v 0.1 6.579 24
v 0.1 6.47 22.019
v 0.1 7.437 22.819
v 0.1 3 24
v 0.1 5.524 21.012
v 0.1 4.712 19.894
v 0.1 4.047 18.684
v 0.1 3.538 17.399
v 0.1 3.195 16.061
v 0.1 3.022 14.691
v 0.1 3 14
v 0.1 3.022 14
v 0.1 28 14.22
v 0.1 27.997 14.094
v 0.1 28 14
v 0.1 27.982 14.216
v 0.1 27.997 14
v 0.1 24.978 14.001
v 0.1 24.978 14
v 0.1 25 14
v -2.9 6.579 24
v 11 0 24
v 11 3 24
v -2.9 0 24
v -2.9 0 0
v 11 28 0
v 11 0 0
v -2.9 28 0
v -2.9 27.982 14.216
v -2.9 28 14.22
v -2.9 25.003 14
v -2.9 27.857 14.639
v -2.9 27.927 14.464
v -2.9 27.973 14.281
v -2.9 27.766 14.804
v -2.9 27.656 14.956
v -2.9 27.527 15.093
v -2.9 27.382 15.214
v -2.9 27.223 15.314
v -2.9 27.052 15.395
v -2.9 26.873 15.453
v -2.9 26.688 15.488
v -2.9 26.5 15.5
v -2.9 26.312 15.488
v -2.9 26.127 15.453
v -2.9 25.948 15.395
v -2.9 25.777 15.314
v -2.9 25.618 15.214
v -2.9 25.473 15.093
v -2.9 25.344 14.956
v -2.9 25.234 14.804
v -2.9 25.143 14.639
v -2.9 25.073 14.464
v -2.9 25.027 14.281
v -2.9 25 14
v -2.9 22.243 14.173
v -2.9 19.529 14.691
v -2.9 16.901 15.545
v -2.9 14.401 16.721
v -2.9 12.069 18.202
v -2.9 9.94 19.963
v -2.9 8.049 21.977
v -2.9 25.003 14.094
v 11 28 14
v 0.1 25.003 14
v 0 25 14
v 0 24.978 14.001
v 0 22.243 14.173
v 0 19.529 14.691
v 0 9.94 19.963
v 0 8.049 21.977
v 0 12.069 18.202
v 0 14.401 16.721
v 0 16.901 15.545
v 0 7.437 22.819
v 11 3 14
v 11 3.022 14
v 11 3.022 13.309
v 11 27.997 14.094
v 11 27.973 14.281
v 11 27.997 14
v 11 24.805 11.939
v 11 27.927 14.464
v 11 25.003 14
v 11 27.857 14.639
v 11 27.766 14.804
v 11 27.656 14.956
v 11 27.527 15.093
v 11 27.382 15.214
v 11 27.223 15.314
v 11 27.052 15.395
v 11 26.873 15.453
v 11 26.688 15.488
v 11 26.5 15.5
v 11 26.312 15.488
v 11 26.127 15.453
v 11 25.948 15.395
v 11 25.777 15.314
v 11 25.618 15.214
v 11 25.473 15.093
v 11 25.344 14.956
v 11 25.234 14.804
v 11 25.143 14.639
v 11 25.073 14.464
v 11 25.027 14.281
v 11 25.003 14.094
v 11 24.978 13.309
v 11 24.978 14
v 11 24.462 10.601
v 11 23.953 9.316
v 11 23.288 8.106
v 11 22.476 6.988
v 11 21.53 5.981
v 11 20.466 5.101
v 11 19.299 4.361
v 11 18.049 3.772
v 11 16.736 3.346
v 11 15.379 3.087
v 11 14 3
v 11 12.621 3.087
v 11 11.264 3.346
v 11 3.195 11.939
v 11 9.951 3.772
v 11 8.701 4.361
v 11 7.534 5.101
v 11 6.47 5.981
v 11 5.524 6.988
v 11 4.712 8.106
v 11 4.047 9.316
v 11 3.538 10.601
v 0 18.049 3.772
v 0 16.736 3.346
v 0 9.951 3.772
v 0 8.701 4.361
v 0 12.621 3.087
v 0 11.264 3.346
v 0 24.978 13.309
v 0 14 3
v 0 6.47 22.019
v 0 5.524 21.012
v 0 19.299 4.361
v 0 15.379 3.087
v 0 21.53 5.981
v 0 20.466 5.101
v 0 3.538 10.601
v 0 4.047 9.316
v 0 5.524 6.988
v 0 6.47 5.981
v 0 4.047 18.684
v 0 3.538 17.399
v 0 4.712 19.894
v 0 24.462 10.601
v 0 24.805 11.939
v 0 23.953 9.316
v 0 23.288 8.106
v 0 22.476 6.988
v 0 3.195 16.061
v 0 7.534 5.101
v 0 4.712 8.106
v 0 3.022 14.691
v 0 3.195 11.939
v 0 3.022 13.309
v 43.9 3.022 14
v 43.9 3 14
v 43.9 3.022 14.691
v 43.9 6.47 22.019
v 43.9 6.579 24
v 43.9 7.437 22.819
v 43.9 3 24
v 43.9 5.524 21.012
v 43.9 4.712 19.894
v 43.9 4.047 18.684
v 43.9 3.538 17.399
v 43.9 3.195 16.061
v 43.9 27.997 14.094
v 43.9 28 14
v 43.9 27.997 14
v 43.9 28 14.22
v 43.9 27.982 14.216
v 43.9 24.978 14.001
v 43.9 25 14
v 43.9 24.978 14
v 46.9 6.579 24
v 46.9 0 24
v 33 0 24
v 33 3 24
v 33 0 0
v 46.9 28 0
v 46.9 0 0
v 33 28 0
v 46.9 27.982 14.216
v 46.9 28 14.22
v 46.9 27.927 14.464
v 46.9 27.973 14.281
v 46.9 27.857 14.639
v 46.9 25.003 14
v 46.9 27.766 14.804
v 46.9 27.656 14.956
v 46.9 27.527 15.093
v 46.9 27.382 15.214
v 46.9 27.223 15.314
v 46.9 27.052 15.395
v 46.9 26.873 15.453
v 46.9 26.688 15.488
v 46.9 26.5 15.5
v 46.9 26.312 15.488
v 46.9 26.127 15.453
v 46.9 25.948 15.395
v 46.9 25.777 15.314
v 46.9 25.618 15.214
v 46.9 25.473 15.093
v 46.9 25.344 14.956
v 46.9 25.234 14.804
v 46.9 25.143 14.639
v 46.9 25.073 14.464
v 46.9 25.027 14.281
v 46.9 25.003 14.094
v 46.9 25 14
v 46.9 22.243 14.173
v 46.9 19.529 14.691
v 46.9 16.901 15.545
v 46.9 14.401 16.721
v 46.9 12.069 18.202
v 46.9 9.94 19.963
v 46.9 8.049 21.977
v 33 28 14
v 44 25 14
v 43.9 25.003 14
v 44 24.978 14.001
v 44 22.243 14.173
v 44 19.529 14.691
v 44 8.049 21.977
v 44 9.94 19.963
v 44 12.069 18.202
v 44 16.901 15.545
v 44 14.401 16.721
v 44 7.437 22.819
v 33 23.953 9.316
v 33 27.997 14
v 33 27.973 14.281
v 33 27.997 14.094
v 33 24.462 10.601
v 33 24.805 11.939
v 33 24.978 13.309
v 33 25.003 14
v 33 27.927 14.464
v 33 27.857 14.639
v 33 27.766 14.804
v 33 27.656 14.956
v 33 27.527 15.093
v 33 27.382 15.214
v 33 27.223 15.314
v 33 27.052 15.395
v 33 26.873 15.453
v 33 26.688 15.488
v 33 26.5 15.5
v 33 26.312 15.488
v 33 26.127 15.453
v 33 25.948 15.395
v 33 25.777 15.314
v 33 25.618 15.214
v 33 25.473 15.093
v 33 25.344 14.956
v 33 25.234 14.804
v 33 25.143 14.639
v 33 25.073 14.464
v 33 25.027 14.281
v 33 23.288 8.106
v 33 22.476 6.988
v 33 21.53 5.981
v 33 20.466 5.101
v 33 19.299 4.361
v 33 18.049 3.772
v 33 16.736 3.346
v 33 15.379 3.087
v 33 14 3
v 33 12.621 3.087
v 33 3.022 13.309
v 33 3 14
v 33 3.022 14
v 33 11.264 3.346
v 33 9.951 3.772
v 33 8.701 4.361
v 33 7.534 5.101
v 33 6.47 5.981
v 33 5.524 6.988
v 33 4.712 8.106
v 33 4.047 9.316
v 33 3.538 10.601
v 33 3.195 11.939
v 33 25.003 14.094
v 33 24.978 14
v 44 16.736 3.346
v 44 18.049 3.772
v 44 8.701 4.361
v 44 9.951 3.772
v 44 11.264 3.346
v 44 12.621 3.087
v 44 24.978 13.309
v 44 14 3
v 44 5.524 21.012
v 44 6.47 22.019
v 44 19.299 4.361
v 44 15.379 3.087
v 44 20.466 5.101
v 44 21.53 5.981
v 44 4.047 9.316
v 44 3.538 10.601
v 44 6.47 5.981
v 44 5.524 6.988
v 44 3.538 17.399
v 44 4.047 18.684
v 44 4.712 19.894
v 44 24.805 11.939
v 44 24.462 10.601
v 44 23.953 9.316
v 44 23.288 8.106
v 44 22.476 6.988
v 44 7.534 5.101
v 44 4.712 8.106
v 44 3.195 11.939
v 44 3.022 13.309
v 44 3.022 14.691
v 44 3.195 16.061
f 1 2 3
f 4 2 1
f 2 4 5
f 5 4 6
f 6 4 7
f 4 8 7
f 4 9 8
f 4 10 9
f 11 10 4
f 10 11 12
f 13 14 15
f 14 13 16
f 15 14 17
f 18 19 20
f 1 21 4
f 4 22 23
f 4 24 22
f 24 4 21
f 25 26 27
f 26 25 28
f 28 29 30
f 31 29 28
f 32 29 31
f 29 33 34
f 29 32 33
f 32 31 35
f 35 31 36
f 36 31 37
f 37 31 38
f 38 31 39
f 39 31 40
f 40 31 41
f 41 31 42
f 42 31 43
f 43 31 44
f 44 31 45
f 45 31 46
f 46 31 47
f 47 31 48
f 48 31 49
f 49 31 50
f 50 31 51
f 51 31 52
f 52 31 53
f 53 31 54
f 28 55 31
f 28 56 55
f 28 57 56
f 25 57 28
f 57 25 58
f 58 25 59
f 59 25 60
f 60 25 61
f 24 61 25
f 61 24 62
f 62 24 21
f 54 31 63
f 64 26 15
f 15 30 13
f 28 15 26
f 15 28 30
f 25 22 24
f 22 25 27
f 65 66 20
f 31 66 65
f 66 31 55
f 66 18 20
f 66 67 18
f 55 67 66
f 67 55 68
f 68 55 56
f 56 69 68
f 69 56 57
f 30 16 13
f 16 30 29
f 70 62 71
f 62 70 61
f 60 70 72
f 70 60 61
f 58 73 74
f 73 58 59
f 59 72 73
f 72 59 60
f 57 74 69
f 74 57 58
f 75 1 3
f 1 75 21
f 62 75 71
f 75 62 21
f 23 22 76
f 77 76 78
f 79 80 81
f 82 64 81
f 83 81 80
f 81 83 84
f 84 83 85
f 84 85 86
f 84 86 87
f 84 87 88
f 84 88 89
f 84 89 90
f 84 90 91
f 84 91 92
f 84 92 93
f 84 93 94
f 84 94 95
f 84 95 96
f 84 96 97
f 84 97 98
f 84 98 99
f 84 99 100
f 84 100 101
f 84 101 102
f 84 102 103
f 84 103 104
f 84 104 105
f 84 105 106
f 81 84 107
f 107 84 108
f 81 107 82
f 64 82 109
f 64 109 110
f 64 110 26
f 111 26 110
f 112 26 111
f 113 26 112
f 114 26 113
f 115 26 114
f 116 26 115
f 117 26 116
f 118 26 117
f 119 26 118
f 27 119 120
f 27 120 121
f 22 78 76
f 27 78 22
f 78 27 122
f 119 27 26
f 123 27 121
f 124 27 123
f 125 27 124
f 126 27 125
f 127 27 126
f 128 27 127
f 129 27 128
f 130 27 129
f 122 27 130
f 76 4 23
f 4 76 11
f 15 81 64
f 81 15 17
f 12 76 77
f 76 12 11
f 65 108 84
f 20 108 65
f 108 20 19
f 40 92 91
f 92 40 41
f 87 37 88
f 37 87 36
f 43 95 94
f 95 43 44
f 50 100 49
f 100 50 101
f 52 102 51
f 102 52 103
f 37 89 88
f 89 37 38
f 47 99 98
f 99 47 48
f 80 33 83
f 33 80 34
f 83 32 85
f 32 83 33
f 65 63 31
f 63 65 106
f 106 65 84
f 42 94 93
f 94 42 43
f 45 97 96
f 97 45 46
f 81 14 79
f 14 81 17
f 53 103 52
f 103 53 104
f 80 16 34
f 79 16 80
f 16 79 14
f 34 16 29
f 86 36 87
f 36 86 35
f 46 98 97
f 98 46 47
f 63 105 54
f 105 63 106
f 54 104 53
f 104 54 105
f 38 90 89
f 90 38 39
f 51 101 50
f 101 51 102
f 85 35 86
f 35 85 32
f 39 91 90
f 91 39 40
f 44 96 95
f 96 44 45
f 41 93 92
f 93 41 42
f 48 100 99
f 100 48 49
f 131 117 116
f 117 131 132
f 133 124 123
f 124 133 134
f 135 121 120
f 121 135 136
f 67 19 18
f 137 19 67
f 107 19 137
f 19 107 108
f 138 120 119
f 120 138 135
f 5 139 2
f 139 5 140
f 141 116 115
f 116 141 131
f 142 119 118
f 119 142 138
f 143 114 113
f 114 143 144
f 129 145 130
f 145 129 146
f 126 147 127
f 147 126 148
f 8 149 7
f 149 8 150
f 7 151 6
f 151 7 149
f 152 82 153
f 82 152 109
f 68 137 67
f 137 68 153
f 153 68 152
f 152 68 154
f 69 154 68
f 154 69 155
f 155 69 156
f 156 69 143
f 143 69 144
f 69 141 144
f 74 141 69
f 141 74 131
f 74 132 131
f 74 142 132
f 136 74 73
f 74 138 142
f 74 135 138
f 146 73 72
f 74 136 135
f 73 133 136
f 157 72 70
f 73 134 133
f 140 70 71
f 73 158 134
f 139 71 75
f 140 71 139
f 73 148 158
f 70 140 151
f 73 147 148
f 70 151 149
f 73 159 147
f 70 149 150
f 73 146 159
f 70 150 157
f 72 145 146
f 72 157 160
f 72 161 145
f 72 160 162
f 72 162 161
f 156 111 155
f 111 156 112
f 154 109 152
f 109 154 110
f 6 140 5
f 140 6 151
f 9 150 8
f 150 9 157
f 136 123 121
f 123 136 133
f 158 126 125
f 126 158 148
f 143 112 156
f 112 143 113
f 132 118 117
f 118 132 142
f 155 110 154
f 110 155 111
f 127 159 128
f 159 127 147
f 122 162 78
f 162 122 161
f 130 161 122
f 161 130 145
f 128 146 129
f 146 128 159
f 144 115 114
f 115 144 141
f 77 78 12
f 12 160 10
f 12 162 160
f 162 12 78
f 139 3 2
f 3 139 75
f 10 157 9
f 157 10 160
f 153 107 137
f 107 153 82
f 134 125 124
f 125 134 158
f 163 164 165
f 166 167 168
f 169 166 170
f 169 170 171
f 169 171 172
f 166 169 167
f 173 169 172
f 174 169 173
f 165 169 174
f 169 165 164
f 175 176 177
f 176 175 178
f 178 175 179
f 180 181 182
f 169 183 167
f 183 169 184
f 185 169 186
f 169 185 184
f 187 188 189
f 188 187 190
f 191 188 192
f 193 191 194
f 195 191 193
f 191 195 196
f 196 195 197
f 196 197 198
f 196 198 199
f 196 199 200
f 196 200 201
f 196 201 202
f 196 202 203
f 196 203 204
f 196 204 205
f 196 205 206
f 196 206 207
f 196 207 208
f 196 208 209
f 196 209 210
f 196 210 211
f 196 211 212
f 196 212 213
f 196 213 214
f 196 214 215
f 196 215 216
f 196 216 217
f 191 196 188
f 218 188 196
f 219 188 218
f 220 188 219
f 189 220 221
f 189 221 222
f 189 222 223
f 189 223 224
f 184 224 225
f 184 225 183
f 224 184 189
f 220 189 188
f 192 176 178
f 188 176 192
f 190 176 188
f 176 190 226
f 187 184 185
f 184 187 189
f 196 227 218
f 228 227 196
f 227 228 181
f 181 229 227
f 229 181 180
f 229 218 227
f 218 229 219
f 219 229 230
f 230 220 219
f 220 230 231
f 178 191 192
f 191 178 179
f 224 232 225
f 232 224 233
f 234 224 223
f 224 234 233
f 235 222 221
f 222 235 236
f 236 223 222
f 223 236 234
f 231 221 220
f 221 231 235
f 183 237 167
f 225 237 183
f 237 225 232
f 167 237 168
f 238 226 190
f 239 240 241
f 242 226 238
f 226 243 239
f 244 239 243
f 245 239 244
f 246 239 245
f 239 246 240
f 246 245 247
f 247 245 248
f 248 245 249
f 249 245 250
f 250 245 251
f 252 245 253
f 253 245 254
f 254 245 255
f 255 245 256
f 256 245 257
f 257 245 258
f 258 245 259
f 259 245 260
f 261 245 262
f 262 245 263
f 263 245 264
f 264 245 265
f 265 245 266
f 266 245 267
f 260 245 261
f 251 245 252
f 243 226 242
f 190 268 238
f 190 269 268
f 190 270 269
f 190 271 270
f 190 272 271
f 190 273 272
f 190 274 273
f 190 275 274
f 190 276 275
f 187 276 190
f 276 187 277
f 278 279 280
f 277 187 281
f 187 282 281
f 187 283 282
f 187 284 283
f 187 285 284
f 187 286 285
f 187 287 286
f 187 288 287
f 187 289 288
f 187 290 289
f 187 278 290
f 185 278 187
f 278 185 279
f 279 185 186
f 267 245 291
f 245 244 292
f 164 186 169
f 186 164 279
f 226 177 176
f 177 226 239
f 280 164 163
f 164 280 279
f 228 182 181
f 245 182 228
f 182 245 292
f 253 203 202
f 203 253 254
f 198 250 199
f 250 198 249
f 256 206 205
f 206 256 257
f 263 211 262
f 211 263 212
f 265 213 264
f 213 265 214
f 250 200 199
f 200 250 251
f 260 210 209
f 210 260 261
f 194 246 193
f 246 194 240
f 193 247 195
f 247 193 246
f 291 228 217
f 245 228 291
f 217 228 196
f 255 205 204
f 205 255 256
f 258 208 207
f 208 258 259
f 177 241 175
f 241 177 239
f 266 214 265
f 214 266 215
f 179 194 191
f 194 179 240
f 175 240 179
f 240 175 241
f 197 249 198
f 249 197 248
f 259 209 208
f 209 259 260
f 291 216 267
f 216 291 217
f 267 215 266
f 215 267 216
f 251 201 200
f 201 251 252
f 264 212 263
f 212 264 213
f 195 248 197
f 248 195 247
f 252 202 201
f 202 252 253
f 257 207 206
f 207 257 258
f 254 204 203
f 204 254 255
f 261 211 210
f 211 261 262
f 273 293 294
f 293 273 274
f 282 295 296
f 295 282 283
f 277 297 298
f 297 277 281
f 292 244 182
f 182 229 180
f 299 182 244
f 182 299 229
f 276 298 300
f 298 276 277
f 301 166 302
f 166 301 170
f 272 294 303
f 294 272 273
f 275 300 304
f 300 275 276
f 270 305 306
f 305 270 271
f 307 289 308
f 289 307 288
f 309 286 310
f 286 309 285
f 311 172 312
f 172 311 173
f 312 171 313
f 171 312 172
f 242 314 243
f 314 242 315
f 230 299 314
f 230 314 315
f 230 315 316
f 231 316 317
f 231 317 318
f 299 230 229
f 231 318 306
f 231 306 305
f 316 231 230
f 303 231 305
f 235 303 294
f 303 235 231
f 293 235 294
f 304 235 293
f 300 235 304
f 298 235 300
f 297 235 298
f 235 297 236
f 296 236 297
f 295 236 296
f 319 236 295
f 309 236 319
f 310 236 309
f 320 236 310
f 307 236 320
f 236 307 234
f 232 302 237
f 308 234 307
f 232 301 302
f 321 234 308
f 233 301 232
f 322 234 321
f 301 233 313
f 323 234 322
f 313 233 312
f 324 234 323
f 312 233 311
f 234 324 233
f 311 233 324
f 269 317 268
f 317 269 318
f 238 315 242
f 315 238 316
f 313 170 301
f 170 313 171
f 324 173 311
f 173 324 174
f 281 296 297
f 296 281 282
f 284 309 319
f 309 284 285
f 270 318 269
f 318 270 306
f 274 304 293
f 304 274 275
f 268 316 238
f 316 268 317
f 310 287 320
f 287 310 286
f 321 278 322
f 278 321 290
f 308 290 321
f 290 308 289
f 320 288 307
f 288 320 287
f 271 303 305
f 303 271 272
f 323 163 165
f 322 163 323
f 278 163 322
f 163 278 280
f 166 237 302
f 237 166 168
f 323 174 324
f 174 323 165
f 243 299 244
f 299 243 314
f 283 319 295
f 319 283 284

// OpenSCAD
/*=========================================
Program Name :	WhiteBoard Marker support
Base Language:	English
Created by   :	Esmarra
Creation Date:	18/04/2014 03:57
Rework date entries:
	21/03/2015 Design Now Compatible with Customizer, polished Comments and variables

Program Objectives: Create a mount for my marker
Observations: It was 2 stl's A part and B
Special Thanks:
=========================================*/

// preview[view:north west, tilt:top diagonal]

// Type In Pen Diameter
pen_d=20  ;
//Enter Pen Diameter + 2 for the gap

// Select Wall Thickness
wall_thick=3 ; 									
//Printed With thickness = 2

/* [Hidden] */
pen_size=pen_d + 2 ; 						// Pen diameter + small gap

wall_h=pen_d/2 +pen_size/2+wall_thick; 		// Biggest Wall Height
$fn=50;
//=============
module support(){
	module base(){
		cube([pen_size/2,wall_thick,wall_h]);
		cube([pen_size/2,pen_size+2*wall_thick,wall_thick+pen_size/2]);
		//pretty
		difference(){
			translate([-wall_thick+.1,0,0]) cube([wall_thick,pen_size+2*wall_thick,wall_h]);
			translate([-wall_thick,pen_size+wall_thick,wall_thick+pen_size/2+pen_size])rotate([0,90,0])cylinder(wall_thick+.2,pen_size,pen_size);			// Edge Slice 
		}
		translate([-wall_thick+.1,pen_size+2*wall_thick-(wall_thick/2),wall_thick+pen_size/2])rotate([0,90,0])cylinder(pen_size/2+wall_thick-.1,wall_thick/2,wall_thick/2);		// Smoth Edge
	}
	difference(){
		base();
		translate([0,wall_thick+pen_size/2,wall_thick+pen_size/2])rotate([0,90,0])cylinder(pen_size/2+.1,pen_size/2,pen_size/2);		// Pen
	}
}

//=============

//=============
module A(){
	support();
}
//=============

//=============
module B(){
	mirror([1,0,0])support();
}
//=============

//=============
module final(){
	support();
	translate([2*pen_size,0,0])mirror([1,0,0])support();
}
//=============


final();
